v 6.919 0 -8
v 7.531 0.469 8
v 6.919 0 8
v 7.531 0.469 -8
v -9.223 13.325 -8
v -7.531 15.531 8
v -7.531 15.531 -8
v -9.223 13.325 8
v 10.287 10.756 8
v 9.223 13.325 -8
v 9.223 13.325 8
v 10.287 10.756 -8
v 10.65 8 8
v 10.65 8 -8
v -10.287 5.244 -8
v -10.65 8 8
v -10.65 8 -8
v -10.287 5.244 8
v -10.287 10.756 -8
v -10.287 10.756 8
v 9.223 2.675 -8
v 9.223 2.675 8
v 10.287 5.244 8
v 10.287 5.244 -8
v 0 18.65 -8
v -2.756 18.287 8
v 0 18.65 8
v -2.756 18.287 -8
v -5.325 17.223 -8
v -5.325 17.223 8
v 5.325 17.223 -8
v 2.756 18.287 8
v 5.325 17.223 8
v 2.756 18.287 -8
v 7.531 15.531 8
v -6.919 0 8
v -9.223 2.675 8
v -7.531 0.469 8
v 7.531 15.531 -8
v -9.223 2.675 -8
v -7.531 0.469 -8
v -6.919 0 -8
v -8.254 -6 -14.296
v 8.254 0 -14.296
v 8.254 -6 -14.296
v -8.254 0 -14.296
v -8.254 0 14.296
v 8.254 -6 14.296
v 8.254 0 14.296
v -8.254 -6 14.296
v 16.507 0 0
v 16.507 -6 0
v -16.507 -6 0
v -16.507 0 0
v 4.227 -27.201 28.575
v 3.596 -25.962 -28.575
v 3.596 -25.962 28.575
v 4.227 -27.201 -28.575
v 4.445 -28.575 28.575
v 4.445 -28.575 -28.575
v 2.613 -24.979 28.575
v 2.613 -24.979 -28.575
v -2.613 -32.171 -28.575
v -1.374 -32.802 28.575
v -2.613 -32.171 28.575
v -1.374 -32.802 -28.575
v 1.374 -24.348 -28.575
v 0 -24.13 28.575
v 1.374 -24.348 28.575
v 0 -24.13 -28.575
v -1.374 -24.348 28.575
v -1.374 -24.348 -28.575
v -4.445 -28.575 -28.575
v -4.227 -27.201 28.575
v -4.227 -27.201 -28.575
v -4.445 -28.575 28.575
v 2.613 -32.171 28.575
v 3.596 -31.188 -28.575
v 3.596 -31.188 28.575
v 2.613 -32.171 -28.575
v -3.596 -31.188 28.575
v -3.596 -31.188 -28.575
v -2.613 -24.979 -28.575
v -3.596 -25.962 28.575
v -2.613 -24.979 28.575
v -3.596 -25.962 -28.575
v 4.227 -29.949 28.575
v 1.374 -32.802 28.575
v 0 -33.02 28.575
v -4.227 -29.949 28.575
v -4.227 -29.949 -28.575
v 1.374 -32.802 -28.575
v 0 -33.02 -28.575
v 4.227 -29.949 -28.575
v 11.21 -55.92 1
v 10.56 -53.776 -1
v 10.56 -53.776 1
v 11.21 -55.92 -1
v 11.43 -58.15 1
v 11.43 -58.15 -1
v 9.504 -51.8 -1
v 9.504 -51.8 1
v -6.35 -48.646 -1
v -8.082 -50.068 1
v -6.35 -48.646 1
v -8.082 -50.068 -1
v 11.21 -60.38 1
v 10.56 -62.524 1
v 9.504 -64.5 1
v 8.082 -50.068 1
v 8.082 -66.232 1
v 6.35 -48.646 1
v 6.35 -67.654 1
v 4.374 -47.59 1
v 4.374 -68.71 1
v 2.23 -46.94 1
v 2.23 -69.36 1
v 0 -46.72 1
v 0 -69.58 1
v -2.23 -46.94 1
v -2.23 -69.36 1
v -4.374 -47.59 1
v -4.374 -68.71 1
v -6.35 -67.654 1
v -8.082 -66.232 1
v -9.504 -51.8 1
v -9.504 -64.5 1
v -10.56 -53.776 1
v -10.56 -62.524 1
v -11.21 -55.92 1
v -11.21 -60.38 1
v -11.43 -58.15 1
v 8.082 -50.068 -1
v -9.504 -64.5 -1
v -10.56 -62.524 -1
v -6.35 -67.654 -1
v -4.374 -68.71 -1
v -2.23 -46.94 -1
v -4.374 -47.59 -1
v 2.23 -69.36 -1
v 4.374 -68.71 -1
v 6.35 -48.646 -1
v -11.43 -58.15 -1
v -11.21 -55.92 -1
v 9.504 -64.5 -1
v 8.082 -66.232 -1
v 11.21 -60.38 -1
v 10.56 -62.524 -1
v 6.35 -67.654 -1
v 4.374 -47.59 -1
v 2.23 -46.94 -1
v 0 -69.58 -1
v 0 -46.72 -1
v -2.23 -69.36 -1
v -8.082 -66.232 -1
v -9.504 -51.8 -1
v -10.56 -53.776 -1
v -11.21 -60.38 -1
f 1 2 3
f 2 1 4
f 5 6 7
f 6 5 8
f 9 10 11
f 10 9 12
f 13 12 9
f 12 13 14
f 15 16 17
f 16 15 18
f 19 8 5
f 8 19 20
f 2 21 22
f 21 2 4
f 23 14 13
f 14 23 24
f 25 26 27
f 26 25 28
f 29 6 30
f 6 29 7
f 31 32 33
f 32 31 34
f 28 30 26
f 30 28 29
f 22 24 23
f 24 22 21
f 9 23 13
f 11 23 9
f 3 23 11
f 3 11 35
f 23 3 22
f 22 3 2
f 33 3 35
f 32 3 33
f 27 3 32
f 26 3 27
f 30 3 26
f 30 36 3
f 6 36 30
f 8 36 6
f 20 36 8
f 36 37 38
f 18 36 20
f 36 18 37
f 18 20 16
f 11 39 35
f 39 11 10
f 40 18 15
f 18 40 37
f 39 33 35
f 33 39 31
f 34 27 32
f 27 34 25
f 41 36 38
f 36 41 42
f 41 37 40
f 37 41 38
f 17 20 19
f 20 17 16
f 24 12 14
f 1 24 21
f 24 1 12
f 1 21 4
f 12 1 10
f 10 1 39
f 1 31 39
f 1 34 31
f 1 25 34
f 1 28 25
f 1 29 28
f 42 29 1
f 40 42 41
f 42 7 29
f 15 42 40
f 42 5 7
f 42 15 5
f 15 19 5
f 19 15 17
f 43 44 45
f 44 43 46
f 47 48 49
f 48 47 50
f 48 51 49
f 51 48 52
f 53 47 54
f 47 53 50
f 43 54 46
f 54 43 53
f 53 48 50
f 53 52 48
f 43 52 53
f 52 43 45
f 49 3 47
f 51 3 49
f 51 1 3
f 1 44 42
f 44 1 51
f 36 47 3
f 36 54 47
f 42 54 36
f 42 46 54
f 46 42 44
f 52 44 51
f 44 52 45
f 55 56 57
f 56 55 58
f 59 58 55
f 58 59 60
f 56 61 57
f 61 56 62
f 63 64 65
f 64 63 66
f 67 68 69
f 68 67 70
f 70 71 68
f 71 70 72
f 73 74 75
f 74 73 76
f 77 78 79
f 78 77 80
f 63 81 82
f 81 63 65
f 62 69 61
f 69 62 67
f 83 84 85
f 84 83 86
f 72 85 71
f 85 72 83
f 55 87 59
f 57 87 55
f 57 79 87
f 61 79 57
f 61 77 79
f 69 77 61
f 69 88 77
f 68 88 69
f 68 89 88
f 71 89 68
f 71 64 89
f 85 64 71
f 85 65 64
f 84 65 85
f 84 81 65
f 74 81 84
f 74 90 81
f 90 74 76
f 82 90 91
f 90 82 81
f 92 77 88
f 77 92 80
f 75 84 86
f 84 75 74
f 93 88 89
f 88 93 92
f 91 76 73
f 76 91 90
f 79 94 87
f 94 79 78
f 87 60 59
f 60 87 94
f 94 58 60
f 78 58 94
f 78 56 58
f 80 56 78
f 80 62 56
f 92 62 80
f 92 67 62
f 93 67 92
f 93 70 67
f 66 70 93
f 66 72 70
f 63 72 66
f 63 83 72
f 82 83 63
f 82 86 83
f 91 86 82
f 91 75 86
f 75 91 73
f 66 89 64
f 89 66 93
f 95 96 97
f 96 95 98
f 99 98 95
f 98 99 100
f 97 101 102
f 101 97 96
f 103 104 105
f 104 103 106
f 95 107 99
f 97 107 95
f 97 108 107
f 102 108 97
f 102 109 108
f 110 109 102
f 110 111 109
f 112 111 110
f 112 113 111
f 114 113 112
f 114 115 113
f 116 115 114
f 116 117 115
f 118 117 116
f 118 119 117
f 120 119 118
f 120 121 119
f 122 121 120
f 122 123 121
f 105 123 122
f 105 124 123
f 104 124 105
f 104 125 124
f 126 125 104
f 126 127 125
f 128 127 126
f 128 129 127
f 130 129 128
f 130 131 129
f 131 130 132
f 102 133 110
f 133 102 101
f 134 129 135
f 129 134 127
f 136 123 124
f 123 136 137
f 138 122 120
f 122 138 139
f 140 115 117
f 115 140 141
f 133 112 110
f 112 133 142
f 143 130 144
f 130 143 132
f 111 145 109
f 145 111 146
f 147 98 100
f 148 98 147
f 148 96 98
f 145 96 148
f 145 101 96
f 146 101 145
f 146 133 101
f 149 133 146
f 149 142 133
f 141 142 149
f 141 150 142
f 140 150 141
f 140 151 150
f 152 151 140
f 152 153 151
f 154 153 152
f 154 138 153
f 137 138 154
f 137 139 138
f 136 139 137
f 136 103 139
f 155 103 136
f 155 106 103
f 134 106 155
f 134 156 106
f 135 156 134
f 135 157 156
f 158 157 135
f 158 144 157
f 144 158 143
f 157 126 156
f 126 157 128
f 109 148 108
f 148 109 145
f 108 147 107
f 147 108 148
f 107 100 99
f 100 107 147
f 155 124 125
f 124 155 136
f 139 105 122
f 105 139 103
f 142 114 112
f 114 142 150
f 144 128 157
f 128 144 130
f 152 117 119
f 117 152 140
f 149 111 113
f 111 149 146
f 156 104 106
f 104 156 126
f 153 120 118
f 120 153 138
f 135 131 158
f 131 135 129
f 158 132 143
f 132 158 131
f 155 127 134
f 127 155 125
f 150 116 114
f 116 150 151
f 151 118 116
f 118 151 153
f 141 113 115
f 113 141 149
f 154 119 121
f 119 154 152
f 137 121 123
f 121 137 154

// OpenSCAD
// Auto-generated by scripts/author_from_manifest.py (Phase D.3).
// Source: data/phase_d_manifest.json (sku_intent='viking-vk200-pendent-155f').
// Do not hand-edit — regenerate from the manifest.
//
// @part viking_vk200_pendent_155f
// @kind sprinkler_head
// @category head.pendant.k56
// @display-name "Viking VK200 Pendent K5.6 SR 155°F"
// @mfg viking_group
// @mfg-pn VK200
// @listing UL FM
// @hazard-classes LH OH1
// @price-usd 13.10
// @install-minutes 8
// @crew journeyman
// @k-factor 5.6
// @orientation pendant
// @response standard
// @temperature 155F
// @param size_in number default=0.5 label="Size" unit="in"
// @port inlet position=[0,0.014,0] direction=[0,1,0] style=NPT_threaded size_in=0.5 role=drop

size_in = 0.5;
k_factor = 5.6;

length_mm   = 57.15;
body_dia_mm = 25.40;
thread_od   = 21.3;
thread_len  = 16;
deflector_d = body_dia_mm * 0.9;

 union() {
    translate([0, thread_len/2, 0])
        cylinder(h = thread_len, d = thread_od, center = true, $fn = 24);
    translate([0, -3, 0])
        rotate([90, 0, 0])
        cylinder(h = 6, d = thread_od * 1.55, $fn = 6, center = true);
    translate([0, -length_mm/2, 0])
        cylinder(h = length_mm, d = body_dia_mm * 0.35, center = true, $fn = 20);
    translate([0, -length_mm - 1, 0])
        cylinder(h = 2, d = deflector_d, center = true, $fn = 32);
}
